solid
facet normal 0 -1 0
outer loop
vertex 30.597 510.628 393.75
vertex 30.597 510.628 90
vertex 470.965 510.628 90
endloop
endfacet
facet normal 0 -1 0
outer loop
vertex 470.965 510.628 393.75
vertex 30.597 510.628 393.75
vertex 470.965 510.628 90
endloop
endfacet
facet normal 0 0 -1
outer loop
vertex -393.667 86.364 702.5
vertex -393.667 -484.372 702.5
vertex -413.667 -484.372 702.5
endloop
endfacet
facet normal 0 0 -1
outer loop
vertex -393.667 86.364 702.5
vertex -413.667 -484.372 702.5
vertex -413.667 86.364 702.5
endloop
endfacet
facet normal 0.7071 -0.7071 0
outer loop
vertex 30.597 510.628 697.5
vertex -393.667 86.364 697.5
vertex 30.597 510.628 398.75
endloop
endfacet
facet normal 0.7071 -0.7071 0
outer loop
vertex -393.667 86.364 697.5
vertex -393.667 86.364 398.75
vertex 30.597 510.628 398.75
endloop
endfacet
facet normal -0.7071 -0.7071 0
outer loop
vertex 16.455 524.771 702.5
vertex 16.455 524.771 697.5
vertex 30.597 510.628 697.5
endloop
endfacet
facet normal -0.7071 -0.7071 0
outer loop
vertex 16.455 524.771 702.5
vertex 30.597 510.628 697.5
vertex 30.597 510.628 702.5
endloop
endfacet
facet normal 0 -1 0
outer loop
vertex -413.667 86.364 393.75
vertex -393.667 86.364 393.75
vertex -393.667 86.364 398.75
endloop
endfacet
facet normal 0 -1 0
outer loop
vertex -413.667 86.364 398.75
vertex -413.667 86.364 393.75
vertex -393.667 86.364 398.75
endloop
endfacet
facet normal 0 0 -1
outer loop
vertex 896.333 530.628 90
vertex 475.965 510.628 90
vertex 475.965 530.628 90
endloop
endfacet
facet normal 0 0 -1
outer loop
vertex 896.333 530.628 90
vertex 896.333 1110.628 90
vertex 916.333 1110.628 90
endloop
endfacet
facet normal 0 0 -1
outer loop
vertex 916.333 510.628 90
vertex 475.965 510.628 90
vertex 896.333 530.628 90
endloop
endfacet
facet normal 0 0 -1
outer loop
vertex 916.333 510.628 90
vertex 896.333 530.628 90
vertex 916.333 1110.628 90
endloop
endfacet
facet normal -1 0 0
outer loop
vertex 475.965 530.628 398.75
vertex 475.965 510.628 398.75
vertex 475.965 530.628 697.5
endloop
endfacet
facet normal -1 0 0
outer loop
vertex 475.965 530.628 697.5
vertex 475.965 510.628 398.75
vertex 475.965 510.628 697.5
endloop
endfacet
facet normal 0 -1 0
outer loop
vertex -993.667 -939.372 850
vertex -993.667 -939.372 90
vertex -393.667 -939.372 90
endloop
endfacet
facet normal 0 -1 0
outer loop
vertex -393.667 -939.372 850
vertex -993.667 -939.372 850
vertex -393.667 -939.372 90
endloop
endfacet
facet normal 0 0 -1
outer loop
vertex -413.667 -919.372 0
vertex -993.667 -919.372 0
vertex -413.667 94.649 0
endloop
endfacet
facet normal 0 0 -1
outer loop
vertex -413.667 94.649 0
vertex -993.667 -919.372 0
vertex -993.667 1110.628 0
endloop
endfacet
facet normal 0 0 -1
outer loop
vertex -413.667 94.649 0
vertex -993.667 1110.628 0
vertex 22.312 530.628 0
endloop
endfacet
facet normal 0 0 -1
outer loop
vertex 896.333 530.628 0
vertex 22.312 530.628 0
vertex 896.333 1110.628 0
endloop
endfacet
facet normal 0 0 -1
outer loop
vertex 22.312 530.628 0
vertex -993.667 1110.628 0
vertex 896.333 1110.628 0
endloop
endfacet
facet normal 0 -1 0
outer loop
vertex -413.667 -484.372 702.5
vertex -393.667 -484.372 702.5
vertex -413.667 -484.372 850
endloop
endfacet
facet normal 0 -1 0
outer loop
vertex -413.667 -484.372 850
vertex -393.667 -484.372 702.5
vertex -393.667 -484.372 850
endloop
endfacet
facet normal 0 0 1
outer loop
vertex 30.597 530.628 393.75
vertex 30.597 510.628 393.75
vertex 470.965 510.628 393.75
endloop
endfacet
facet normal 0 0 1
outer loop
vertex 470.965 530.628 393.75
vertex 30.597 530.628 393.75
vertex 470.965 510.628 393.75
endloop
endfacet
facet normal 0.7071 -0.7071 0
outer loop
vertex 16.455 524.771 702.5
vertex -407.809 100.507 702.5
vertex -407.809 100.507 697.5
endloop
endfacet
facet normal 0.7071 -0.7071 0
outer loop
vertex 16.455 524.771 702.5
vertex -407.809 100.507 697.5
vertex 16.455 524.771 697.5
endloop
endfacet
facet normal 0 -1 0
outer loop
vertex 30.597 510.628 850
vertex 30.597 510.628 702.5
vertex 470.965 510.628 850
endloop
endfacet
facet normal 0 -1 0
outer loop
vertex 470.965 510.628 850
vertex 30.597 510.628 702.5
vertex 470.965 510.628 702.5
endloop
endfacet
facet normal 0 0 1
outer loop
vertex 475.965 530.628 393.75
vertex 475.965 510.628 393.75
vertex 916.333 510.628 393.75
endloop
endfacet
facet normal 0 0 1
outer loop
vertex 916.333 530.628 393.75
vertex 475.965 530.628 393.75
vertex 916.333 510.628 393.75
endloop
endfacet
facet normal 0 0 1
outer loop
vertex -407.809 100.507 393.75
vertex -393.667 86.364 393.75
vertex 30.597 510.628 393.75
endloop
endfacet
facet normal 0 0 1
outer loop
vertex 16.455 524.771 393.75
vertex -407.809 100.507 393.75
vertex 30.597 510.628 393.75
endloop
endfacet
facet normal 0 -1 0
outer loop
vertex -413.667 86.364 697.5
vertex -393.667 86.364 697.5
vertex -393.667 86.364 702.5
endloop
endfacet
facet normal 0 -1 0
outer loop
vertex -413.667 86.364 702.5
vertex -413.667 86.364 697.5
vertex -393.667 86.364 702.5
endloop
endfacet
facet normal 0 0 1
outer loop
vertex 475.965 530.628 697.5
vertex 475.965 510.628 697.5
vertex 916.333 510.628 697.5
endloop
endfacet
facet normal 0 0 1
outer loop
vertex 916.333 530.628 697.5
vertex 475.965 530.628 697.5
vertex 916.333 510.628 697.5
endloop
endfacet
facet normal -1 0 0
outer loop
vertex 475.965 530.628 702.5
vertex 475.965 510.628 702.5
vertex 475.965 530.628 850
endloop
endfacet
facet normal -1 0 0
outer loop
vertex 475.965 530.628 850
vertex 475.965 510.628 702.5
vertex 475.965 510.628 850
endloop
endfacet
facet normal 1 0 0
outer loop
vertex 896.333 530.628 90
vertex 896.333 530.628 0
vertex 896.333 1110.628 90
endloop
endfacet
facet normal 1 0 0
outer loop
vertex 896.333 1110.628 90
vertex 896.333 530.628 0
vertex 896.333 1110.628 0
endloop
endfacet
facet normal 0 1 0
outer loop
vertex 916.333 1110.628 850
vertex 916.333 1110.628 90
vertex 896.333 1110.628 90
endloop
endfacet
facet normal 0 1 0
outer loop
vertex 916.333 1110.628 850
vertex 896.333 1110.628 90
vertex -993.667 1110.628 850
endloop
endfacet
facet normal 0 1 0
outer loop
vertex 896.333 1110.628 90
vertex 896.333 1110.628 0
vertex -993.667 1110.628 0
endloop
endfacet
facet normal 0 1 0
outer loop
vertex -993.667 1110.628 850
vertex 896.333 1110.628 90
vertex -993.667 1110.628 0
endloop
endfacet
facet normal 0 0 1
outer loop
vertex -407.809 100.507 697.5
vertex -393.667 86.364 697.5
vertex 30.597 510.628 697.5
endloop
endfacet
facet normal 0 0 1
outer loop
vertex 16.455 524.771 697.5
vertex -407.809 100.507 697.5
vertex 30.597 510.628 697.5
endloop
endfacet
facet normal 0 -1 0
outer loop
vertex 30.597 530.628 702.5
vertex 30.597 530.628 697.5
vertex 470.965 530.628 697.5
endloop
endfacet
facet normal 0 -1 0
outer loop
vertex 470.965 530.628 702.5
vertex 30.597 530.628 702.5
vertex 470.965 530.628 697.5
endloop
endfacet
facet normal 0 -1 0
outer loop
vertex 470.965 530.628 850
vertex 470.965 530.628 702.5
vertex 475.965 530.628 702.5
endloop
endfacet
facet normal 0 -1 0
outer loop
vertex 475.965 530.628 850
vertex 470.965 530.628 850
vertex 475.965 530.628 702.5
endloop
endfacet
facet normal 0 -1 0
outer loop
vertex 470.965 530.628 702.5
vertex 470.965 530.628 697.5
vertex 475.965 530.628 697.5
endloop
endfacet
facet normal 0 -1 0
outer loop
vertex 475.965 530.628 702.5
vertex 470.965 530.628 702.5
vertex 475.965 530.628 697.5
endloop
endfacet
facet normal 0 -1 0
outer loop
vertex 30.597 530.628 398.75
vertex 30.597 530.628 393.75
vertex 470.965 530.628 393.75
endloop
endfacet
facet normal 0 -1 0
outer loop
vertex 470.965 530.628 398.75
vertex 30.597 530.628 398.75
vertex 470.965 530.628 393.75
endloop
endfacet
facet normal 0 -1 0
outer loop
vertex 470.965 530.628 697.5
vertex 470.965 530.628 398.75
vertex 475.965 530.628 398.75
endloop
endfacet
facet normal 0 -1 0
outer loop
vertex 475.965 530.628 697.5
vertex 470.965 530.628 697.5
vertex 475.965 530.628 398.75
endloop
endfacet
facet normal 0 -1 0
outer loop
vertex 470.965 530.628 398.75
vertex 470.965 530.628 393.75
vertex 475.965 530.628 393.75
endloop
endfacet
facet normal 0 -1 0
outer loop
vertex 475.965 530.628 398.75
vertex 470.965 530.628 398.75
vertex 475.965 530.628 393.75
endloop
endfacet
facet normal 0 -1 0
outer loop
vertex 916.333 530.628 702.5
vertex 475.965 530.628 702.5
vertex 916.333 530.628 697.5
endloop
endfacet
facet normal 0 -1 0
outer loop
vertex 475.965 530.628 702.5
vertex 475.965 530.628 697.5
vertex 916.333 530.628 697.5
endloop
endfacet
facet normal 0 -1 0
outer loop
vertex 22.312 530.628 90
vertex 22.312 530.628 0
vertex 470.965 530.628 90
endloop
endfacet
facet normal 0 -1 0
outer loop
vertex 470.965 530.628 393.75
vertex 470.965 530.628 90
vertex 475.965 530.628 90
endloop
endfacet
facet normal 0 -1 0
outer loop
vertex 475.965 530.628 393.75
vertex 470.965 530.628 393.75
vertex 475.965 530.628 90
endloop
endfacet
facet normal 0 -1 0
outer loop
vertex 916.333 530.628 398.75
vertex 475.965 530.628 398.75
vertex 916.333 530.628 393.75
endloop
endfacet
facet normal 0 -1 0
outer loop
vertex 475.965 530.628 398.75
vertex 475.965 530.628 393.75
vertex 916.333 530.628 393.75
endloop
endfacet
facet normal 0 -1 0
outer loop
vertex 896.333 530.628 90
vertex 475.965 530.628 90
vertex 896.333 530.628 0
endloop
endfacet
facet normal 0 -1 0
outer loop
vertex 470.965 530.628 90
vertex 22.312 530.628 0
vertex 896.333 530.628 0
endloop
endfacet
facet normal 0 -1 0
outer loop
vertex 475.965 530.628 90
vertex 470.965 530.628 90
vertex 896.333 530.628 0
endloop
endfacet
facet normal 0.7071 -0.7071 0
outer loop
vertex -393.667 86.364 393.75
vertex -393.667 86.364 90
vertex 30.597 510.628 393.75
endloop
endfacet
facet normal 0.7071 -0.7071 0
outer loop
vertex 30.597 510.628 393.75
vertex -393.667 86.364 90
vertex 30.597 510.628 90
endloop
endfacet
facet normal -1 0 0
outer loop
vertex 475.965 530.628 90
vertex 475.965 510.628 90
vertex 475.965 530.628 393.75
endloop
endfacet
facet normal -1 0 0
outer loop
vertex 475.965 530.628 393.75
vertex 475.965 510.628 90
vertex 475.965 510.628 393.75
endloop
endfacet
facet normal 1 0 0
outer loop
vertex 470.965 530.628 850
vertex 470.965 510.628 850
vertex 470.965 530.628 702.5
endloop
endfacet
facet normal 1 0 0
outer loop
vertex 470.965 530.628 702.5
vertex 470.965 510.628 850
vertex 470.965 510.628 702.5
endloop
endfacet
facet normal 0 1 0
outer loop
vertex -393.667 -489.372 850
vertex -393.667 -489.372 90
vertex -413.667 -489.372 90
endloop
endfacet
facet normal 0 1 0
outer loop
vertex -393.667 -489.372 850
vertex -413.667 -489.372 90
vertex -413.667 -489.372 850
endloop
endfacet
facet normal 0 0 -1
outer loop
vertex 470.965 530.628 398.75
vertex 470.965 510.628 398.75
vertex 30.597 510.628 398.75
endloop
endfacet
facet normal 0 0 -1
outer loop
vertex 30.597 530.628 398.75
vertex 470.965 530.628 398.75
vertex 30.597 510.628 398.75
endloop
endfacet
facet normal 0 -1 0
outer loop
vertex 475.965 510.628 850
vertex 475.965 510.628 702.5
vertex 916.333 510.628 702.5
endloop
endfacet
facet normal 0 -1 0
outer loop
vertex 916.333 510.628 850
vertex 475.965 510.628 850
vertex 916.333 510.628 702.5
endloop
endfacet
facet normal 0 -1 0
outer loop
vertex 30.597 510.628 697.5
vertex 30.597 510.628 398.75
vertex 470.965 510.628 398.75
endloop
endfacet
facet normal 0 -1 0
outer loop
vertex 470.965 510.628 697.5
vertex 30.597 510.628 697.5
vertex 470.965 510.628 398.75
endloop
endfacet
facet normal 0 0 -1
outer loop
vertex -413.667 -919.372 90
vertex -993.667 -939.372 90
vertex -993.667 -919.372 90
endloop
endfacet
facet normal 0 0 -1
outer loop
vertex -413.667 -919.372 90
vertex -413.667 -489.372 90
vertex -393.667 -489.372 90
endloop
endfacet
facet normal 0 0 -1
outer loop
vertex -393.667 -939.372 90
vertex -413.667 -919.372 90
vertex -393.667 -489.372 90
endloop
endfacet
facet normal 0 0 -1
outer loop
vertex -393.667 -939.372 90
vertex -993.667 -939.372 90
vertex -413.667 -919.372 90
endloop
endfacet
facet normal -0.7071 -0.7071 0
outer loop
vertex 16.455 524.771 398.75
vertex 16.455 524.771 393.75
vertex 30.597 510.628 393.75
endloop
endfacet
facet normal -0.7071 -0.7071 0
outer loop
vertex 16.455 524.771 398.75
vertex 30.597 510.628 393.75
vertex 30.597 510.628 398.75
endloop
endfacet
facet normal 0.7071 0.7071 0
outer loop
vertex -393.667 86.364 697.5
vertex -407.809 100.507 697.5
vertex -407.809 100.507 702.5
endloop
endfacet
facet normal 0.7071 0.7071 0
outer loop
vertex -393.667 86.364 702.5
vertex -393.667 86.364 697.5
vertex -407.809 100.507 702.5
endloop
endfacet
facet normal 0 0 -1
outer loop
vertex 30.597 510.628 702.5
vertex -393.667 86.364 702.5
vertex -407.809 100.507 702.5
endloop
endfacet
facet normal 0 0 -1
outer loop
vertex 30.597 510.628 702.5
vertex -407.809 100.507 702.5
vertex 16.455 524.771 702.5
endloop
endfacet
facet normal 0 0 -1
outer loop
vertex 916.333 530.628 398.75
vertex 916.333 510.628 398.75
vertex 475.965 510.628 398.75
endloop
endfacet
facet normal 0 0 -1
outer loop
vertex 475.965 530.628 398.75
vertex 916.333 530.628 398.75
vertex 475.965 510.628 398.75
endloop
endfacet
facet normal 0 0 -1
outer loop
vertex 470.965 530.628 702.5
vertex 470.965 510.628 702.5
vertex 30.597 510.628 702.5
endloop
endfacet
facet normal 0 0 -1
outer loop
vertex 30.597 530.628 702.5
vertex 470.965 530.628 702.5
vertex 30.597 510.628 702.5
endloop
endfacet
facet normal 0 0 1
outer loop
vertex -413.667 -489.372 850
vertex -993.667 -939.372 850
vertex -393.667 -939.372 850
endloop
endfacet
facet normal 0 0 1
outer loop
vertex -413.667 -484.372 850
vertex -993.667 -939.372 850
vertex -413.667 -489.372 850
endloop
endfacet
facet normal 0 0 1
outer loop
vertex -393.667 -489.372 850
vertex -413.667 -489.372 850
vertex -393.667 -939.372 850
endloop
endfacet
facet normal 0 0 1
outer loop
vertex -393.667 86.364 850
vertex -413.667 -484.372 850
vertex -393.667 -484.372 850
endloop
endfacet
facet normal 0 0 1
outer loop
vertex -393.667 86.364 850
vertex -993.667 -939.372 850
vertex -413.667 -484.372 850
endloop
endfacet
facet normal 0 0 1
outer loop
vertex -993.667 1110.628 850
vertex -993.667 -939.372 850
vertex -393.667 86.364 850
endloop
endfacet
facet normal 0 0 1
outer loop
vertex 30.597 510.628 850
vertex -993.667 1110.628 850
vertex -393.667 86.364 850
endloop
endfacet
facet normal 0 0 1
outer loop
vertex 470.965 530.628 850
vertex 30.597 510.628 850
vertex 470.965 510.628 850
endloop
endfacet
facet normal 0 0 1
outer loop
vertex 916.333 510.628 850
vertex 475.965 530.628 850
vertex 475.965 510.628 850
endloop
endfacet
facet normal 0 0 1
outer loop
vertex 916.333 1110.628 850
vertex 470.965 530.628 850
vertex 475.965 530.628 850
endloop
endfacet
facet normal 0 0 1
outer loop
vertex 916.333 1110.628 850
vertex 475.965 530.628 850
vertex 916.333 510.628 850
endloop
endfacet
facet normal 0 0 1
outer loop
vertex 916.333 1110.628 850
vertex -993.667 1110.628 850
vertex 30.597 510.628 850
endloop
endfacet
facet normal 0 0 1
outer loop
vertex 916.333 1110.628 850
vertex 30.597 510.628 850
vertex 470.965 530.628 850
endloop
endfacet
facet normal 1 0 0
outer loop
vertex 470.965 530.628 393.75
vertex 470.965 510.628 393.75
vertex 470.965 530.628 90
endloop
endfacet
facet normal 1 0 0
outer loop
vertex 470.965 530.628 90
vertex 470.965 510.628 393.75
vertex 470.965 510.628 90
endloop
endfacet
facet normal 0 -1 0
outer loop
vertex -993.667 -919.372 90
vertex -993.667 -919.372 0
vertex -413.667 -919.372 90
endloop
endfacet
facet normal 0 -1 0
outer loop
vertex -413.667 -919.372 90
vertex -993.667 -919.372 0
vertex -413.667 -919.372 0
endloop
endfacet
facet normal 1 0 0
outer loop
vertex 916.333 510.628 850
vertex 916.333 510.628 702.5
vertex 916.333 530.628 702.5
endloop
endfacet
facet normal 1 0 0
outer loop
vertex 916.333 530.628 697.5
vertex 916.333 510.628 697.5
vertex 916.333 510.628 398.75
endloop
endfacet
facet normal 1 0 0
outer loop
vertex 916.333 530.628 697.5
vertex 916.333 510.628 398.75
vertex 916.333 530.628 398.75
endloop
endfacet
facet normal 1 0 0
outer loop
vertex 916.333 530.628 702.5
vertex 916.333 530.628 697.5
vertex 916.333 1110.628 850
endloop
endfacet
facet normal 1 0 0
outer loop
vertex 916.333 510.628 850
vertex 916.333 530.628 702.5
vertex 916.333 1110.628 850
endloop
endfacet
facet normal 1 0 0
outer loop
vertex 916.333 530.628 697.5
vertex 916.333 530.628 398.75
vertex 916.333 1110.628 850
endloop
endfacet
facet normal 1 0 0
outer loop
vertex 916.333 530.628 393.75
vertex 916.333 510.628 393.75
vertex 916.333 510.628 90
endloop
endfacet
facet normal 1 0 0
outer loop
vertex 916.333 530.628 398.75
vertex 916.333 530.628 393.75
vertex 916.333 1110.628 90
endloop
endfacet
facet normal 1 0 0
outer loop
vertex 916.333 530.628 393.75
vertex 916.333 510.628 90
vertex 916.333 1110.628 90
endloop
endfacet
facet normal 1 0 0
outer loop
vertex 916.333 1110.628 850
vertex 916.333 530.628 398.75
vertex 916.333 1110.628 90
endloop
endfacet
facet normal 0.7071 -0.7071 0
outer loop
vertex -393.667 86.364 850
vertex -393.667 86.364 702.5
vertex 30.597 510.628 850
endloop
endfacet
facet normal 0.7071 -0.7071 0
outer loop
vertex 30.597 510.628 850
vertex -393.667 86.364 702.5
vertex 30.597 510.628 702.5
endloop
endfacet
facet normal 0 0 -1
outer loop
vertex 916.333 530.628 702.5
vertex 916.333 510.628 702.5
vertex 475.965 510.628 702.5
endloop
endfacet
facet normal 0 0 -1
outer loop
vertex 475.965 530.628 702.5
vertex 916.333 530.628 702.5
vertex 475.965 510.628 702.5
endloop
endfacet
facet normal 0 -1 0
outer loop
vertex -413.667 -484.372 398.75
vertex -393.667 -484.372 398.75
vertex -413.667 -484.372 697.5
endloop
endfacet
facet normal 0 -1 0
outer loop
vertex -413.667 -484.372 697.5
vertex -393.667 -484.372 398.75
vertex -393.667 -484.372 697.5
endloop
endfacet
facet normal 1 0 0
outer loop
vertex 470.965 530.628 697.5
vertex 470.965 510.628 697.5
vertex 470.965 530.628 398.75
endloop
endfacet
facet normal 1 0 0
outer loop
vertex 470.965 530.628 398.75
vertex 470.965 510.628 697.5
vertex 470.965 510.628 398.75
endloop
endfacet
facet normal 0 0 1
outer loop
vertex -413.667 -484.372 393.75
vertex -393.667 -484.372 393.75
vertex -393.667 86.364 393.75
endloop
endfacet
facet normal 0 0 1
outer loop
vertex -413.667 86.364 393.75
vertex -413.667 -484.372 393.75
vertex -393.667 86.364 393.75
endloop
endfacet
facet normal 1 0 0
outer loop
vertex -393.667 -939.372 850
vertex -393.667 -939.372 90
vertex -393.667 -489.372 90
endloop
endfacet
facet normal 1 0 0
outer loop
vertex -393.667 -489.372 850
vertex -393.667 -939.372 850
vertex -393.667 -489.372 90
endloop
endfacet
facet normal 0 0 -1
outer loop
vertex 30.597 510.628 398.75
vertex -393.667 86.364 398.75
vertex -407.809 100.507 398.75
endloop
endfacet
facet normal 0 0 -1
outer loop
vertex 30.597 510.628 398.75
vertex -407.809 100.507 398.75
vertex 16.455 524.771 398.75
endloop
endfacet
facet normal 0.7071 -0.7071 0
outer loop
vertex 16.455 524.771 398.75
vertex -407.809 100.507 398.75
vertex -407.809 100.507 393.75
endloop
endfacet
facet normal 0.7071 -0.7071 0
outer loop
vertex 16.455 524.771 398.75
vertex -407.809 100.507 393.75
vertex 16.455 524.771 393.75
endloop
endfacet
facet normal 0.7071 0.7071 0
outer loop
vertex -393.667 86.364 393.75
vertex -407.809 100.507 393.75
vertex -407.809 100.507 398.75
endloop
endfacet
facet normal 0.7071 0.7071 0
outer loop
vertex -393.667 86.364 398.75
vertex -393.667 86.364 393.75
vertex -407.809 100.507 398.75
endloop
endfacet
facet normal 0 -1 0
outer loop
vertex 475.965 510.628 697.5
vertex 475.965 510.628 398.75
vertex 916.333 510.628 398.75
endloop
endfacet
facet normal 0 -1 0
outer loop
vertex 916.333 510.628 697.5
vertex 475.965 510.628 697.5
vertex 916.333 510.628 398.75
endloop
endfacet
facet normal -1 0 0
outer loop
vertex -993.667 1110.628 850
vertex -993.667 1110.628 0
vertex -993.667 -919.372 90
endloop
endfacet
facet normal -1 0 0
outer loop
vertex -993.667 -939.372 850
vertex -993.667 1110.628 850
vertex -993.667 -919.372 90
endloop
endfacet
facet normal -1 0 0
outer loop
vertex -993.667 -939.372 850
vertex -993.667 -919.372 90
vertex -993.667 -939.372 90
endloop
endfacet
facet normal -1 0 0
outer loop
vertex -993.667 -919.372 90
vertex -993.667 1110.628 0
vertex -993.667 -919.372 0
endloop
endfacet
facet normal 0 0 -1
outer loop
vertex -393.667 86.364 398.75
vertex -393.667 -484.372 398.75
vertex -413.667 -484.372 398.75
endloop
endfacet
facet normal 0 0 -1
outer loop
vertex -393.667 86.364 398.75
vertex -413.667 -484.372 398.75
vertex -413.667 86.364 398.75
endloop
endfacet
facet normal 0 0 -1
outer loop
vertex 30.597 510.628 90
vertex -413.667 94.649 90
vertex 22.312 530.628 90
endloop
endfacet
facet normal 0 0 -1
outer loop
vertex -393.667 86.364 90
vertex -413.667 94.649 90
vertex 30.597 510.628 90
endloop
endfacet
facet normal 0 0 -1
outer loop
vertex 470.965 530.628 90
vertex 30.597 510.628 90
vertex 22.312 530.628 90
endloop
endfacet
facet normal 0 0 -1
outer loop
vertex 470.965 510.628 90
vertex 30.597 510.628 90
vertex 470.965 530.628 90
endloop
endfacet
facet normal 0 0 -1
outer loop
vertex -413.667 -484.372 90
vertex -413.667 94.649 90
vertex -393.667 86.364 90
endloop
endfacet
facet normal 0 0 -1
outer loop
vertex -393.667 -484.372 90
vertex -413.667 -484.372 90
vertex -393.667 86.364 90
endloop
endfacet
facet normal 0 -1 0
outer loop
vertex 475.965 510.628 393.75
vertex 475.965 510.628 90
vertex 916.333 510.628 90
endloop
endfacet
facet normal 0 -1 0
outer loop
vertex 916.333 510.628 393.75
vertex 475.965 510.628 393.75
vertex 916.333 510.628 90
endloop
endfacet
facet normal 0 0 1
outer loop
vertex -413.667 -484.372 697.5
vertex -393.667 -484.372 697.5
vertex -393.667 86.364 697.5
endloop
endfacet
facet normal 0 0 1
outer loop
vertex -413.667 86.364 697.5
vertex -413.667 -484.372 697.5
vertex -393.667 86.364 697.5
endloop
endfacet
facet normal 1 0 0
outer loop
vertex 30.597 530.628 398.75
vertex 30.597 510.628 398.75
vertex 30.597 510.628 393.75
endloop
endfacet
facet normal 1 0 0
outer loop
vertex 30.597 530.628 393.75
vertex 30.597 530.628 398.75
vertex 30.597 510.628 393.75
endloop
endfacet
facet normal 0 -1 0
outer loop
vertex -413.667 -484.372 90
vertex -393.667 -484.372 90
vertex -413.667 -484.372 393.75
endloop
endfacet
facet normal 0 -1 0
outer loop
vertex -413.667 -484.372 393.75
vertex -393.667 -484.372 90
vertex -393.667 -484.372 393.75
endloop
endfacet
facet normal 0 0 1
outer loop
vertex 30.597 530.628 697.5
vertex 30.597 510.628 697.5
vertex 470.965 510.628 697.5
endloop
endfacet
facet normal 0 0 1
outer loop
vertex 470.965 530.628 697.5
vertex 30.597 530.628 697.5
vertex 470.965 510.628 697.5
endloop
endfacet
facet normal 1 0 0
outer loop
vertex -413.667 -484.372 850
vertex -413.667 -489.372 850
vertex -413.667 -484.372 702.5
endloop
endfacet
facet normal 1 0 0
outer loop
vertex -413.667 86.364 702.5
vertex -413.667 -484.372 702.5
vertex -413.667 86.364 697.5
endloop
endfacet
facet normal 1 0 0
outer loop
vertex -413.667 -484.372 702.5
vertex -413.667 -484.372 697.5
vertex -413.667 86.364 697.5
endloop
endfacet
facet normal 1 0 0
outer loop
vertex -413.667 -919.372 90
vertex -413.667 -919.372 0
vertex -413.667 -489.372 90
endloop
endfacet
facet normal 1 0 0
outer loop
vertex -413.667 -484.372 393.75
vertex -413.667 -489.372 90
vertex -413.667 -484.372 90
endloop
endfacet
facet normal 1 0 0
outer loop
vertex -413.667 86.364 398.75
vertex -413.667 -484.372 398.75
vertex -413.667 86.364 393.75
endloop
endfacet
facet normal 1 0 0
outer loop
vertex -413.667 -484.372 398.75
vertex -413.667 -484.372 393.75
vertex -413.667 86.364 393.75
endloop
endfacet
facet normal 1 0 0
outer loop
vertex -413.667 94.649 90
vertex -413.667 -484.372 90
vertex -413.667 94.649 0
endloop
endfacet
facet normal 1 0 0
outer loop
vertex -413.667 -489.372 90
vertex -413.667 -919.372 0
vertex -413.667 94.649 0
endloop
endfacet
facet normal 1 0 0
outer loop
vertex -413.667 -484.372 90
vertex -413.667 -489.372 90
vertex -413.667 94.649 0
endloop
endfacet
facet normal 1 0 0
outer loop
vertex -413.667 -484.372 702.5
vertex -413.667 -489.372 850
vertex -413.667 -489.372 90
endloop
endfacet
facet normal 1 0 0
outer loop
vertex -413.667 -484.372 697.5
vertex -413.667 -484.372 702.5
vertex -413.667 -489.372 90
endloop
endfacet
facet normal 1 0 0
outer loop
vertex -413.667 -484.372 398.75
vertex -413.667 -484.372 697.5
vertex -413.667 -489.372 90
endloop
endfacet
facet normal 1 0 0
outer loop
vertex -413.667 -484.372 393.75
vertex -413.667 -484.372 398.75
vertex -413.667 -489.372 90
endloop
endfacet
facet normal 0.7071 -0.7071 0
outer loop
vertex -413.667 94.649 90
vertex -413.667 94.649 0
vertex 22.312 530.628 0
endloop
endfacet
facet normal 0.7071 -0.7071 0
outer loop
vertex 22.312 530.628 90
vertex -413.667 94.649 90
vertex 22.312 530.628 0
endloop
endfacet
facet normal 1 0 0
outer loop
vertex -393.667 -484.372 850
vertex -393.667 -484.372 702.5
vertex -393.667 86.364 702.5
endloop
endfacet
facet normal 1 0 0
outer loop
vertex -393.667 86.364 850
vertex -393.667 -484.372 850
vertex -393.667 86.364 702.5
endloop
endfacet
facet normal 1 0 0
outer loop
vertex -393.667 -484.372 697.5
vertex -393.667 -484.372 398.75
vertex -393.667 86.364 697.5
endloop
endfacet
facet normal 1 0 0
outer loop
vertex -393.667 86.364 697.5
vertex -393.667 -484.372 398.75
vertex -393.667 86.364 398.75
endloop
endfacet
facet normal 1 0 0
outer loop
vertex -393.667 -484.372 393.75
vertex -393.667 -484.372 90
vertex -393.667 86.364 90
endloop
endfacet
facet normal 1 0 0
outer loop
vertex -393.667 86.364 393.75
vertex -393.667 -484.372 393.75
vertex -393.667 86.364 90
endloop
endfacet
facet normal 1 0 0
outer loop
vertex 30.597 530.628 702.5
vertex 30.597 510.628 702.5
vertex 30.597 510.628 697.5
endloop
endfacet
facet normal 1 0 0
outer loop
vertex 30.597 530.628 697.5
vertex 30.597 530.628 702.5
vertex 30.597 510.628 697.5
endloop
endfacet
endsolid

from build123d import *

# Parameters (mm, degrees)
F1_DEPTH  = 850
F3_DEPTH  = 90
F4_W      = 5
F4_H      = 760
F5_DEPTH  = 20
F7_DEPTH  = 20
F8_W      = 570.735931
F8_H      = 5
F9_DEPTH  = 20
F10_W     = 600
F10_H     = 5
F11_DEPTH = 20


with BuildPart() as f1:
    # F0 (on Top) → F1 (new body)
    with BuildSketch(Plane.XY):
        Polygon((-993.667342, 1110.628466), (-993.667342, -939.371534), (-393.667342, -939.371534), (-393.667342, 86.364397), (30.596727, 510.628466), (916.332658, 510.628466), (916.332658, 1110.628466), align=None)
    extrude(amount=F1_DEPTH)

    # F2 (on face) → F3 (cut)
    with BuildSketch(Plane(origin=(0, 0, 0), x_dir=(1, 0, 0), z_dir=(0, 0, -1))):
        Polygon((-993.667342, 919.371534), (-413.667342, 919.371534), (-413.667342, -94.648668), (22.312456, -530.628466), (896.332658, -530.628466), (896.332658, -1110.628466), (916.332658, -1110.628466), (916.332658, -510.628466), (30.596727, -510.628466), (-393.667342, -86.364397), (-393.667342, 939.371534), (-993.667342, 939.371534), align=None)
    extrude(amount=-F3_DEPTH, mode=Mode.SUBTRACT)

    # F4 (on face) → F5 (cut)
    with BuildSketch(Plane.YZ.offset(-393.667342)):
        with Locations((-486.871534, 470)):
            Rectangle(F4_W, F4_H)
    extrude(amount=-F5_DEPTH, mode=Mode.SUBTRACT)

    # F6 (on face) → F7 (cut)
    with BuildSketch(Plane.XZ.offset(-510.628466)):
        Polygon((470.964693, 702.5), (30.596727, 702.5), (30.596727, 697.5), (470.964693, 697.5), (470.964693, 398.75), (30.596727, 398.75), (30.596727, 393.75), (470.964693, 393.75), (470.964693, 90), (475.964693, 90), (475.964693, 393.75), (916.332658, 393.75), (916.332658, 398.75), (475.964693, 398.75), (475.964693, 697.5), (916.332658, 697.5), (916.332658, 702.5), (475.964693, 702.5), (475.964693, 850), (470.964693, 850), align=None)
    extrude(amount=-F7_DEPTH, mode=Mode.SUBTRACT)

    # F8 (on face) → F9 (cut)
    with BuildSketch(Plane.YZ.offset(-393.667342)):
        with Locations((-199.003569, 700)):
            Rectangle(F8_W, F8_H)
        with Locations((-199.003569, 396.25)):
            Rectangle(F8_W, F8_H)
    extrude(amount=-F9_DEPTH, mode=Mode.SUBTRACT)

    # F10 (on face) → F11 (cut)
    with BuildSketch(Plane(origin=(-240.015869, 240.015869, 0), x_dir=(0.707107, 0.707107, 0), z_dir=(0.707107, -0.707107, 0))):
        with Locations((82.704004, 700)):
            Rectangle(F10_W, F10_H)
        with Locations((82.704004, 396.25)):
            Rectangle(F10_W, F10_H)
    extrude(amount=-F11_DEPTH, mode=Mode.SUBTRACT)


solid = f1.part
